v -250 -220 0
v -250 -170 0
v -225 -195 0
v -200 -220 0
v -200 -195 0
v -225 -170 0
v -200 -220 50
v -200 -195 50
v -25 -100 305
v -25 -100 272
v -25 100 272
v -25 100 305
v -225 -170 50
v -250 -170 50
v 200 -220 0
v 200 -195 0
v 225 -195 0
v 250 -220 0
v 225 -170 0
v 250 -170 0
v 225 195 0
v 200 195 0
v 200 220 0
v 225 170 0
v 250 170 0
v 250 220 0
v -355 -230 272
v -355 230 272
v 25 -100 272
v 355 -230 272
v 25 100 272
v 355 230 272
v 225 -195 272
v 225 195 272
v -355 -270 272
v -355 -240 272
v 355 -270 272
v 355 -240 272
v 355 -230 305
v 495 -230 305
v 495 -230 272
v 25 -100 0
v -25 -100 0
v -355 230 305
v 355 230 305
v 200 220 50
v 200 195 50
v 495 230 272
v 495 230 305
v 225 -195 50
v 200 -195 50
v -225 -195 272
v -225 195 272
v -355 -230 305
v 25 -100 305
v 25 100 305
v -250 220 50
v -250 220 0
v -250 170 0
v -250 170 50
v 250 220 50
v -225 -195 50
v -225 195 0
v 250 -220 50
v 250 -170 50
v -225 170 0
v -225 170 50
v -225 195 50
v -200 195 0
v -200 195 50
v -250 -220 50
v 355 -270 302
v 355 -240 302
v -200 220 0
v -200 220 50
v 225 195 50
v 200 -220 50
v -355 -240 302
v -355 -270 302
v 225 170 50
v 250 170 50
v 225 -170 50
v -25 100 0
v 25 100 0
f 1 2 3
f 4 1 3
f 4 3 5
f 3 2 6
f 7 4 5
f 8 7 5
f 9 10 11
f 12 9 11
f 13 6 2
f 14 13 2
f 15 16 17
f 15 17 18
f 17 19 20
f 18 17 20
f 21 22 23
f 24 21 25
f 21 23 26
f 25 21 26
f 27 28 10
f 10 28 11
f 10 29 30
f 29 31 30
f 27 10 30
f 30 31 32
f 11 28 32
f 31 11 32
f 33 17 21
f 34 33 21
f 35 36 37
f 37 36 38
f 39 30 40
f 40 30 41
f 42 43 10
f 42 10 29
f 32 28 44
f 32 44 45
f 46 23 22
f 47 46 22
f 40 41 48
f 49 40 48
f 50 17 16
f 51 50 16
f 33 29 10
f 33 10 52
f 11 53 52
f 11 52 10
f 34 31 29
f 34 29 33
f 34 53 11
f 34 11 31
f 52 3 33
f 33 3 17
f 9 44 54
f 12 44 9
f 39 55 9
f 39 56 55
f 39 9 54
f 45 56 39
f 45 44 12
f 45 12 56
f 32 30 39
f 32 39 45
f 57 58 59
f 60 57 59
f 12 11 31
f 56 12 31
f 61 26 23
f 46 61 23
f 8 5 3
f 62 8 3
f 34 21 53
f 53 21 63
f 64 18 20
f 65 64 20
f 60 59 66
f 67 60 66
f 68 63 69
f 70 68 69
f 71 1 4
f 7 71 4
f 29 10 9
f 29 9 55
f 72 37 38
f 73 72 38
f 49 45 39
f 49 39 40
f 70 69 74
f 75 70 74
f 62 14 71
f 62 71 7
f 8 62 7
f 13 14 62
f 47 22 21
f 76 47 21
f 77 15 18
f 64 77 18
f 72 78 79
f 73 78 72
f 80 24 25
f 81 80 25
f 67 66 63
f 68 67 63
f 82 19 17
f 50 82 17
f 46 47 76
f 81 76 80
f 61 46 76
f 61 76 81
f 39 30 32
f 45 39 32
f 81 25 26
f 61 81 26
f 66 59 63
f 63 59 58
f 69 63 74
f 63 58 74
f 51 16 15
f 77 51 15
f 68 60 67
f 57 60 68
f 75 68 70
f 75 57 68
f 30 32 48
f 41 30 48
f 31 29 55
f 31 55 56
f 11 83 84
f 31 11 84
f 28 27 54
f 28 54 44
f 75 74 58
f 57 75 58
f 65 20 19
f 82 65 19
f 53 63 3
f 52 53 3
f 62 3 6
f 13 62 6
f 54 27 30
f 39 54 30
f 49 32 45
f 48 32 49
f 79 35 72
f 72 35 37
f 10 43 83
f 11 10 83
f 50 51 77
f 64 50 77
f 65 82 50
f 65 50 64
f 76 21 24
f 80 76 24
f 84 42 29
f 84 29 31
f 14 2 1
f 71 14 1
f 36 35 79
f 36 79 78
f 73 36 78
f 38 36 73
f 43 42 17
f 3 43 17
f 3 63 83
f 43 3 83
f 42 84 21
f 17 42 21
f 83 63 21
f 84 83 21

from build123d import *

# Parameters (mm, degrees)
F0_W     = 50
F0_H     = 200
F0_W_2   = 25
F0_H_2   = 25
F1_DEPTH = 272
F2_DEPTH = 50
F3_W     = 710
F3_H     = 460
F3_W_2   = 450
F3_H_2   = 390
F3_W_3   = 50
F3_H_3   = 200
F4_DEPTH = 33
F3_H_4   = 30
F5_DEPTH = 30
F3_W_4   = 140
F6_DEPTH = 33


with BuildPart() as f1:
    # F0 (on Top) → F1 (new body)
    with BuildSketch(Plane.XY):
        Polygon((-200, -195), (200, -195), (200, -170), (225, -170), (225, 170), (200, 170), (200, 195), (-200, 195), (-200, 170), (-225, 170), (-225, -170), (-200, -170), align=None)
        Rectangle(F0_W, F0_H, mode=Mode.SUBTRACT)
        with Locations((-212.5, 182.5)):
            Rectangle(F0_W_2, F0_H_2)
        with Locations((-212.5, -182.5)):
            Rectangle(F0_W_2, F0_H_2)
        with Locations((212.5, -182.5)):
            Rectangle(F0_W_2, F0_H_2)
        with Locations((212.5, 182.5)):
            Rectangle(F0_W_2, F0_H_2)
    extrude(amount=F1_DEPTH)


with BuildPart() as f2:
    # F0 (on Top) → F2 (new body)
    with BuildSketch(Plane.XY):
        Polygon((-250, 170), (-225, 170), (-225, 195), (-200, 195), (-200, 220), (-250, 220), align=None)
    extrude(amount=F2_DEPTH)


with BuildPart() as f2b:
    # F0 (on Top) → F2, piece 2 (new body)
    with BuildSketch(Plane.XY):
        Polygon((-200, -220), (-200, -195), (-225, -195), (-225, -170), (-250, -170), (-250, -220), align=None)
    extrude(amount=F2_DEPTH)


with BuildPart() as f2c:
    # F0 (on Top) → F2, piece 3 (new body)
    with BuildSketch(Plane.XY):
        Polygon((225, -170), (225, -195), (200, -195), (200, -220), (250, -220), (250, -170), align=None)
    extrude(amount=F2_DEPTH)


with BuildPart() as f2d:
    # F0 (on Top) → F2, piece 4 (new body)
    with BuildSketch(Plane.XY):
        Polygon((225, 195), (225, 170), (250, 170), (250, 220), (200, 220), (200, 195), align=None)
    extrude(amount=F2_DEPTH)


with BuildPart() as f4:
    # F3 (on face) → F4 (new body)
    with BuildSketch(Plane.XY.offset(272)):
        Rectangle(F3_W, F3_H)
        Rectangle(F3_W_2, F3_H_2, mode=Mode.SUBTRACT)
        Rectangle(F3_W_2, F3_H_2)
        Rectangle(F3_W_3, F3_H_3, mode=Mode.SUBTRACT)
    extrude(amount=F4_DEPTH)


with BuildPart() as f5:
    # F3 (on face) → F5 (new body)
    with BuildSketch(Plane.XY.offset(272)):
        with Locations((0, -255)):
            Rectangle(F3_W, F3_H_4)
    extrude(amount=F5_DEPTH)


with BuildPart() as f6:
    # F3 (on face) → F6 (new body)
    with BuildSketch(Plane.XY.offset(272)):
        with Locations((425, 0)):
            Rectangle(F3_W_4, F3_H)
    extrude(amount=F6_DEPTH)


solid = Compound([f1.part, f2.part, f2b.part, f2c.part, f2d.part, f4.part, f5.part, f6.part])
